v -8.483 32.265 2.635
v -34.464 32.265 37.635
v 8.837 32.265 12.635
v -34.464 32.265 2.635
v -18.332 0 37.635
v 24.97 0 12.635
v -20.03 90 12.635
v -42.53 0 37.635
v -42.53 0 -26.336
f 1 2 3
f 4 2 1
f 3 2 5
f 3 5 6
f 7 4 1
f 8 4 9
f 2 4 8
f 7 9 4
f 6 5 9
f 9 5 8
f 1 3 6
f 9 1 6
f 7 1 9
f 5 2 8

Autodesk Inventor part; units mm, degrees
ref_plane "YZ Plane" through (0, 0, 0) normal (1, 0, 0) x (0, 1, 0)
ref_plane "XZ Plane" through (0, 0, 0) normal (0, 1, 0) x (-1, 0, 0)
ref_plane "XY Plane" through (0, 0, 0) normal (0, 0, 1) x (1, 0, 0)
sketch "Эскиз1" plane through (0, 0, 0) normal (0, 1, 0) x (-1, 0, 0)
  line L0 (-24.9696, 12.6351) -> (42.5304, 51.6062)
  line L1 (42.5304, 51.6062) -> (42.5304, -26.3361)
  line L2 (42.5304, -26.3361) -> (-24.9696, 12.6351)
  point P0 (0, 0)
  point P1 (20.0304, 12.6351)
ref_plane "РабПлоскость2" through (0, 90, 0) normal (0, 1, 0) x (-1, 0, 0)
ref_plane "РабПлоскость1" through (0, 0, 0) normal (0, 1, 0) x (-1, 0, 0)
sketch "Эскиз3" plane through (0, 90, 0) normal (0, 1, 0) x (-1, 0, 0)
  point P0 (0, 0)
  point P1 (20.0304, 12.635)
loft "Лофт1" add profiles "Эскиз1" section 2 point at (-20.0304, 90, 12.635)
sketch "Эскиз4" plane through (0, 0, 0) normal (1, 0, 0) x (0, 1, 0)
  line L0 (0, 51.6062) -> (90, 12.635) projected
  line L1 (32.265, 37.6351) -> (32.265, 12.6351)
  line L2 (0, 12.6351) -> (90, 12.635) projected
  line L3 (32.265, 12.6351) -> (32.265, 2.6351)
  line L4 (0, -26.3361) -> (90, 12.635) projected
  line L5 (32.265, 2.6351) -> (90, 12.635)
  point P0 (0, 0)
  dimension "d6" = 25
  dimension "d7" = 10
extrude "Выдавливание1" cut sketch "Эскиз4" along normal mid plane 1000
sketch "Эскиз5" plane through (0, 0, 0) normal (1, 0, 0) x (0, 1, 0)
  line L0 (0, 51.6062) -> (32.265, 37.6351) projected
  line L1 (32.265, 37.6351) -> (0, 37.6351)
  line L2 (0, 51.6062) -> (0, -26.3361) projected
  point P0 (0, 0)
extrude "Выдавливание2" cut sketch "Эскиз5" along normal mid plane 100
